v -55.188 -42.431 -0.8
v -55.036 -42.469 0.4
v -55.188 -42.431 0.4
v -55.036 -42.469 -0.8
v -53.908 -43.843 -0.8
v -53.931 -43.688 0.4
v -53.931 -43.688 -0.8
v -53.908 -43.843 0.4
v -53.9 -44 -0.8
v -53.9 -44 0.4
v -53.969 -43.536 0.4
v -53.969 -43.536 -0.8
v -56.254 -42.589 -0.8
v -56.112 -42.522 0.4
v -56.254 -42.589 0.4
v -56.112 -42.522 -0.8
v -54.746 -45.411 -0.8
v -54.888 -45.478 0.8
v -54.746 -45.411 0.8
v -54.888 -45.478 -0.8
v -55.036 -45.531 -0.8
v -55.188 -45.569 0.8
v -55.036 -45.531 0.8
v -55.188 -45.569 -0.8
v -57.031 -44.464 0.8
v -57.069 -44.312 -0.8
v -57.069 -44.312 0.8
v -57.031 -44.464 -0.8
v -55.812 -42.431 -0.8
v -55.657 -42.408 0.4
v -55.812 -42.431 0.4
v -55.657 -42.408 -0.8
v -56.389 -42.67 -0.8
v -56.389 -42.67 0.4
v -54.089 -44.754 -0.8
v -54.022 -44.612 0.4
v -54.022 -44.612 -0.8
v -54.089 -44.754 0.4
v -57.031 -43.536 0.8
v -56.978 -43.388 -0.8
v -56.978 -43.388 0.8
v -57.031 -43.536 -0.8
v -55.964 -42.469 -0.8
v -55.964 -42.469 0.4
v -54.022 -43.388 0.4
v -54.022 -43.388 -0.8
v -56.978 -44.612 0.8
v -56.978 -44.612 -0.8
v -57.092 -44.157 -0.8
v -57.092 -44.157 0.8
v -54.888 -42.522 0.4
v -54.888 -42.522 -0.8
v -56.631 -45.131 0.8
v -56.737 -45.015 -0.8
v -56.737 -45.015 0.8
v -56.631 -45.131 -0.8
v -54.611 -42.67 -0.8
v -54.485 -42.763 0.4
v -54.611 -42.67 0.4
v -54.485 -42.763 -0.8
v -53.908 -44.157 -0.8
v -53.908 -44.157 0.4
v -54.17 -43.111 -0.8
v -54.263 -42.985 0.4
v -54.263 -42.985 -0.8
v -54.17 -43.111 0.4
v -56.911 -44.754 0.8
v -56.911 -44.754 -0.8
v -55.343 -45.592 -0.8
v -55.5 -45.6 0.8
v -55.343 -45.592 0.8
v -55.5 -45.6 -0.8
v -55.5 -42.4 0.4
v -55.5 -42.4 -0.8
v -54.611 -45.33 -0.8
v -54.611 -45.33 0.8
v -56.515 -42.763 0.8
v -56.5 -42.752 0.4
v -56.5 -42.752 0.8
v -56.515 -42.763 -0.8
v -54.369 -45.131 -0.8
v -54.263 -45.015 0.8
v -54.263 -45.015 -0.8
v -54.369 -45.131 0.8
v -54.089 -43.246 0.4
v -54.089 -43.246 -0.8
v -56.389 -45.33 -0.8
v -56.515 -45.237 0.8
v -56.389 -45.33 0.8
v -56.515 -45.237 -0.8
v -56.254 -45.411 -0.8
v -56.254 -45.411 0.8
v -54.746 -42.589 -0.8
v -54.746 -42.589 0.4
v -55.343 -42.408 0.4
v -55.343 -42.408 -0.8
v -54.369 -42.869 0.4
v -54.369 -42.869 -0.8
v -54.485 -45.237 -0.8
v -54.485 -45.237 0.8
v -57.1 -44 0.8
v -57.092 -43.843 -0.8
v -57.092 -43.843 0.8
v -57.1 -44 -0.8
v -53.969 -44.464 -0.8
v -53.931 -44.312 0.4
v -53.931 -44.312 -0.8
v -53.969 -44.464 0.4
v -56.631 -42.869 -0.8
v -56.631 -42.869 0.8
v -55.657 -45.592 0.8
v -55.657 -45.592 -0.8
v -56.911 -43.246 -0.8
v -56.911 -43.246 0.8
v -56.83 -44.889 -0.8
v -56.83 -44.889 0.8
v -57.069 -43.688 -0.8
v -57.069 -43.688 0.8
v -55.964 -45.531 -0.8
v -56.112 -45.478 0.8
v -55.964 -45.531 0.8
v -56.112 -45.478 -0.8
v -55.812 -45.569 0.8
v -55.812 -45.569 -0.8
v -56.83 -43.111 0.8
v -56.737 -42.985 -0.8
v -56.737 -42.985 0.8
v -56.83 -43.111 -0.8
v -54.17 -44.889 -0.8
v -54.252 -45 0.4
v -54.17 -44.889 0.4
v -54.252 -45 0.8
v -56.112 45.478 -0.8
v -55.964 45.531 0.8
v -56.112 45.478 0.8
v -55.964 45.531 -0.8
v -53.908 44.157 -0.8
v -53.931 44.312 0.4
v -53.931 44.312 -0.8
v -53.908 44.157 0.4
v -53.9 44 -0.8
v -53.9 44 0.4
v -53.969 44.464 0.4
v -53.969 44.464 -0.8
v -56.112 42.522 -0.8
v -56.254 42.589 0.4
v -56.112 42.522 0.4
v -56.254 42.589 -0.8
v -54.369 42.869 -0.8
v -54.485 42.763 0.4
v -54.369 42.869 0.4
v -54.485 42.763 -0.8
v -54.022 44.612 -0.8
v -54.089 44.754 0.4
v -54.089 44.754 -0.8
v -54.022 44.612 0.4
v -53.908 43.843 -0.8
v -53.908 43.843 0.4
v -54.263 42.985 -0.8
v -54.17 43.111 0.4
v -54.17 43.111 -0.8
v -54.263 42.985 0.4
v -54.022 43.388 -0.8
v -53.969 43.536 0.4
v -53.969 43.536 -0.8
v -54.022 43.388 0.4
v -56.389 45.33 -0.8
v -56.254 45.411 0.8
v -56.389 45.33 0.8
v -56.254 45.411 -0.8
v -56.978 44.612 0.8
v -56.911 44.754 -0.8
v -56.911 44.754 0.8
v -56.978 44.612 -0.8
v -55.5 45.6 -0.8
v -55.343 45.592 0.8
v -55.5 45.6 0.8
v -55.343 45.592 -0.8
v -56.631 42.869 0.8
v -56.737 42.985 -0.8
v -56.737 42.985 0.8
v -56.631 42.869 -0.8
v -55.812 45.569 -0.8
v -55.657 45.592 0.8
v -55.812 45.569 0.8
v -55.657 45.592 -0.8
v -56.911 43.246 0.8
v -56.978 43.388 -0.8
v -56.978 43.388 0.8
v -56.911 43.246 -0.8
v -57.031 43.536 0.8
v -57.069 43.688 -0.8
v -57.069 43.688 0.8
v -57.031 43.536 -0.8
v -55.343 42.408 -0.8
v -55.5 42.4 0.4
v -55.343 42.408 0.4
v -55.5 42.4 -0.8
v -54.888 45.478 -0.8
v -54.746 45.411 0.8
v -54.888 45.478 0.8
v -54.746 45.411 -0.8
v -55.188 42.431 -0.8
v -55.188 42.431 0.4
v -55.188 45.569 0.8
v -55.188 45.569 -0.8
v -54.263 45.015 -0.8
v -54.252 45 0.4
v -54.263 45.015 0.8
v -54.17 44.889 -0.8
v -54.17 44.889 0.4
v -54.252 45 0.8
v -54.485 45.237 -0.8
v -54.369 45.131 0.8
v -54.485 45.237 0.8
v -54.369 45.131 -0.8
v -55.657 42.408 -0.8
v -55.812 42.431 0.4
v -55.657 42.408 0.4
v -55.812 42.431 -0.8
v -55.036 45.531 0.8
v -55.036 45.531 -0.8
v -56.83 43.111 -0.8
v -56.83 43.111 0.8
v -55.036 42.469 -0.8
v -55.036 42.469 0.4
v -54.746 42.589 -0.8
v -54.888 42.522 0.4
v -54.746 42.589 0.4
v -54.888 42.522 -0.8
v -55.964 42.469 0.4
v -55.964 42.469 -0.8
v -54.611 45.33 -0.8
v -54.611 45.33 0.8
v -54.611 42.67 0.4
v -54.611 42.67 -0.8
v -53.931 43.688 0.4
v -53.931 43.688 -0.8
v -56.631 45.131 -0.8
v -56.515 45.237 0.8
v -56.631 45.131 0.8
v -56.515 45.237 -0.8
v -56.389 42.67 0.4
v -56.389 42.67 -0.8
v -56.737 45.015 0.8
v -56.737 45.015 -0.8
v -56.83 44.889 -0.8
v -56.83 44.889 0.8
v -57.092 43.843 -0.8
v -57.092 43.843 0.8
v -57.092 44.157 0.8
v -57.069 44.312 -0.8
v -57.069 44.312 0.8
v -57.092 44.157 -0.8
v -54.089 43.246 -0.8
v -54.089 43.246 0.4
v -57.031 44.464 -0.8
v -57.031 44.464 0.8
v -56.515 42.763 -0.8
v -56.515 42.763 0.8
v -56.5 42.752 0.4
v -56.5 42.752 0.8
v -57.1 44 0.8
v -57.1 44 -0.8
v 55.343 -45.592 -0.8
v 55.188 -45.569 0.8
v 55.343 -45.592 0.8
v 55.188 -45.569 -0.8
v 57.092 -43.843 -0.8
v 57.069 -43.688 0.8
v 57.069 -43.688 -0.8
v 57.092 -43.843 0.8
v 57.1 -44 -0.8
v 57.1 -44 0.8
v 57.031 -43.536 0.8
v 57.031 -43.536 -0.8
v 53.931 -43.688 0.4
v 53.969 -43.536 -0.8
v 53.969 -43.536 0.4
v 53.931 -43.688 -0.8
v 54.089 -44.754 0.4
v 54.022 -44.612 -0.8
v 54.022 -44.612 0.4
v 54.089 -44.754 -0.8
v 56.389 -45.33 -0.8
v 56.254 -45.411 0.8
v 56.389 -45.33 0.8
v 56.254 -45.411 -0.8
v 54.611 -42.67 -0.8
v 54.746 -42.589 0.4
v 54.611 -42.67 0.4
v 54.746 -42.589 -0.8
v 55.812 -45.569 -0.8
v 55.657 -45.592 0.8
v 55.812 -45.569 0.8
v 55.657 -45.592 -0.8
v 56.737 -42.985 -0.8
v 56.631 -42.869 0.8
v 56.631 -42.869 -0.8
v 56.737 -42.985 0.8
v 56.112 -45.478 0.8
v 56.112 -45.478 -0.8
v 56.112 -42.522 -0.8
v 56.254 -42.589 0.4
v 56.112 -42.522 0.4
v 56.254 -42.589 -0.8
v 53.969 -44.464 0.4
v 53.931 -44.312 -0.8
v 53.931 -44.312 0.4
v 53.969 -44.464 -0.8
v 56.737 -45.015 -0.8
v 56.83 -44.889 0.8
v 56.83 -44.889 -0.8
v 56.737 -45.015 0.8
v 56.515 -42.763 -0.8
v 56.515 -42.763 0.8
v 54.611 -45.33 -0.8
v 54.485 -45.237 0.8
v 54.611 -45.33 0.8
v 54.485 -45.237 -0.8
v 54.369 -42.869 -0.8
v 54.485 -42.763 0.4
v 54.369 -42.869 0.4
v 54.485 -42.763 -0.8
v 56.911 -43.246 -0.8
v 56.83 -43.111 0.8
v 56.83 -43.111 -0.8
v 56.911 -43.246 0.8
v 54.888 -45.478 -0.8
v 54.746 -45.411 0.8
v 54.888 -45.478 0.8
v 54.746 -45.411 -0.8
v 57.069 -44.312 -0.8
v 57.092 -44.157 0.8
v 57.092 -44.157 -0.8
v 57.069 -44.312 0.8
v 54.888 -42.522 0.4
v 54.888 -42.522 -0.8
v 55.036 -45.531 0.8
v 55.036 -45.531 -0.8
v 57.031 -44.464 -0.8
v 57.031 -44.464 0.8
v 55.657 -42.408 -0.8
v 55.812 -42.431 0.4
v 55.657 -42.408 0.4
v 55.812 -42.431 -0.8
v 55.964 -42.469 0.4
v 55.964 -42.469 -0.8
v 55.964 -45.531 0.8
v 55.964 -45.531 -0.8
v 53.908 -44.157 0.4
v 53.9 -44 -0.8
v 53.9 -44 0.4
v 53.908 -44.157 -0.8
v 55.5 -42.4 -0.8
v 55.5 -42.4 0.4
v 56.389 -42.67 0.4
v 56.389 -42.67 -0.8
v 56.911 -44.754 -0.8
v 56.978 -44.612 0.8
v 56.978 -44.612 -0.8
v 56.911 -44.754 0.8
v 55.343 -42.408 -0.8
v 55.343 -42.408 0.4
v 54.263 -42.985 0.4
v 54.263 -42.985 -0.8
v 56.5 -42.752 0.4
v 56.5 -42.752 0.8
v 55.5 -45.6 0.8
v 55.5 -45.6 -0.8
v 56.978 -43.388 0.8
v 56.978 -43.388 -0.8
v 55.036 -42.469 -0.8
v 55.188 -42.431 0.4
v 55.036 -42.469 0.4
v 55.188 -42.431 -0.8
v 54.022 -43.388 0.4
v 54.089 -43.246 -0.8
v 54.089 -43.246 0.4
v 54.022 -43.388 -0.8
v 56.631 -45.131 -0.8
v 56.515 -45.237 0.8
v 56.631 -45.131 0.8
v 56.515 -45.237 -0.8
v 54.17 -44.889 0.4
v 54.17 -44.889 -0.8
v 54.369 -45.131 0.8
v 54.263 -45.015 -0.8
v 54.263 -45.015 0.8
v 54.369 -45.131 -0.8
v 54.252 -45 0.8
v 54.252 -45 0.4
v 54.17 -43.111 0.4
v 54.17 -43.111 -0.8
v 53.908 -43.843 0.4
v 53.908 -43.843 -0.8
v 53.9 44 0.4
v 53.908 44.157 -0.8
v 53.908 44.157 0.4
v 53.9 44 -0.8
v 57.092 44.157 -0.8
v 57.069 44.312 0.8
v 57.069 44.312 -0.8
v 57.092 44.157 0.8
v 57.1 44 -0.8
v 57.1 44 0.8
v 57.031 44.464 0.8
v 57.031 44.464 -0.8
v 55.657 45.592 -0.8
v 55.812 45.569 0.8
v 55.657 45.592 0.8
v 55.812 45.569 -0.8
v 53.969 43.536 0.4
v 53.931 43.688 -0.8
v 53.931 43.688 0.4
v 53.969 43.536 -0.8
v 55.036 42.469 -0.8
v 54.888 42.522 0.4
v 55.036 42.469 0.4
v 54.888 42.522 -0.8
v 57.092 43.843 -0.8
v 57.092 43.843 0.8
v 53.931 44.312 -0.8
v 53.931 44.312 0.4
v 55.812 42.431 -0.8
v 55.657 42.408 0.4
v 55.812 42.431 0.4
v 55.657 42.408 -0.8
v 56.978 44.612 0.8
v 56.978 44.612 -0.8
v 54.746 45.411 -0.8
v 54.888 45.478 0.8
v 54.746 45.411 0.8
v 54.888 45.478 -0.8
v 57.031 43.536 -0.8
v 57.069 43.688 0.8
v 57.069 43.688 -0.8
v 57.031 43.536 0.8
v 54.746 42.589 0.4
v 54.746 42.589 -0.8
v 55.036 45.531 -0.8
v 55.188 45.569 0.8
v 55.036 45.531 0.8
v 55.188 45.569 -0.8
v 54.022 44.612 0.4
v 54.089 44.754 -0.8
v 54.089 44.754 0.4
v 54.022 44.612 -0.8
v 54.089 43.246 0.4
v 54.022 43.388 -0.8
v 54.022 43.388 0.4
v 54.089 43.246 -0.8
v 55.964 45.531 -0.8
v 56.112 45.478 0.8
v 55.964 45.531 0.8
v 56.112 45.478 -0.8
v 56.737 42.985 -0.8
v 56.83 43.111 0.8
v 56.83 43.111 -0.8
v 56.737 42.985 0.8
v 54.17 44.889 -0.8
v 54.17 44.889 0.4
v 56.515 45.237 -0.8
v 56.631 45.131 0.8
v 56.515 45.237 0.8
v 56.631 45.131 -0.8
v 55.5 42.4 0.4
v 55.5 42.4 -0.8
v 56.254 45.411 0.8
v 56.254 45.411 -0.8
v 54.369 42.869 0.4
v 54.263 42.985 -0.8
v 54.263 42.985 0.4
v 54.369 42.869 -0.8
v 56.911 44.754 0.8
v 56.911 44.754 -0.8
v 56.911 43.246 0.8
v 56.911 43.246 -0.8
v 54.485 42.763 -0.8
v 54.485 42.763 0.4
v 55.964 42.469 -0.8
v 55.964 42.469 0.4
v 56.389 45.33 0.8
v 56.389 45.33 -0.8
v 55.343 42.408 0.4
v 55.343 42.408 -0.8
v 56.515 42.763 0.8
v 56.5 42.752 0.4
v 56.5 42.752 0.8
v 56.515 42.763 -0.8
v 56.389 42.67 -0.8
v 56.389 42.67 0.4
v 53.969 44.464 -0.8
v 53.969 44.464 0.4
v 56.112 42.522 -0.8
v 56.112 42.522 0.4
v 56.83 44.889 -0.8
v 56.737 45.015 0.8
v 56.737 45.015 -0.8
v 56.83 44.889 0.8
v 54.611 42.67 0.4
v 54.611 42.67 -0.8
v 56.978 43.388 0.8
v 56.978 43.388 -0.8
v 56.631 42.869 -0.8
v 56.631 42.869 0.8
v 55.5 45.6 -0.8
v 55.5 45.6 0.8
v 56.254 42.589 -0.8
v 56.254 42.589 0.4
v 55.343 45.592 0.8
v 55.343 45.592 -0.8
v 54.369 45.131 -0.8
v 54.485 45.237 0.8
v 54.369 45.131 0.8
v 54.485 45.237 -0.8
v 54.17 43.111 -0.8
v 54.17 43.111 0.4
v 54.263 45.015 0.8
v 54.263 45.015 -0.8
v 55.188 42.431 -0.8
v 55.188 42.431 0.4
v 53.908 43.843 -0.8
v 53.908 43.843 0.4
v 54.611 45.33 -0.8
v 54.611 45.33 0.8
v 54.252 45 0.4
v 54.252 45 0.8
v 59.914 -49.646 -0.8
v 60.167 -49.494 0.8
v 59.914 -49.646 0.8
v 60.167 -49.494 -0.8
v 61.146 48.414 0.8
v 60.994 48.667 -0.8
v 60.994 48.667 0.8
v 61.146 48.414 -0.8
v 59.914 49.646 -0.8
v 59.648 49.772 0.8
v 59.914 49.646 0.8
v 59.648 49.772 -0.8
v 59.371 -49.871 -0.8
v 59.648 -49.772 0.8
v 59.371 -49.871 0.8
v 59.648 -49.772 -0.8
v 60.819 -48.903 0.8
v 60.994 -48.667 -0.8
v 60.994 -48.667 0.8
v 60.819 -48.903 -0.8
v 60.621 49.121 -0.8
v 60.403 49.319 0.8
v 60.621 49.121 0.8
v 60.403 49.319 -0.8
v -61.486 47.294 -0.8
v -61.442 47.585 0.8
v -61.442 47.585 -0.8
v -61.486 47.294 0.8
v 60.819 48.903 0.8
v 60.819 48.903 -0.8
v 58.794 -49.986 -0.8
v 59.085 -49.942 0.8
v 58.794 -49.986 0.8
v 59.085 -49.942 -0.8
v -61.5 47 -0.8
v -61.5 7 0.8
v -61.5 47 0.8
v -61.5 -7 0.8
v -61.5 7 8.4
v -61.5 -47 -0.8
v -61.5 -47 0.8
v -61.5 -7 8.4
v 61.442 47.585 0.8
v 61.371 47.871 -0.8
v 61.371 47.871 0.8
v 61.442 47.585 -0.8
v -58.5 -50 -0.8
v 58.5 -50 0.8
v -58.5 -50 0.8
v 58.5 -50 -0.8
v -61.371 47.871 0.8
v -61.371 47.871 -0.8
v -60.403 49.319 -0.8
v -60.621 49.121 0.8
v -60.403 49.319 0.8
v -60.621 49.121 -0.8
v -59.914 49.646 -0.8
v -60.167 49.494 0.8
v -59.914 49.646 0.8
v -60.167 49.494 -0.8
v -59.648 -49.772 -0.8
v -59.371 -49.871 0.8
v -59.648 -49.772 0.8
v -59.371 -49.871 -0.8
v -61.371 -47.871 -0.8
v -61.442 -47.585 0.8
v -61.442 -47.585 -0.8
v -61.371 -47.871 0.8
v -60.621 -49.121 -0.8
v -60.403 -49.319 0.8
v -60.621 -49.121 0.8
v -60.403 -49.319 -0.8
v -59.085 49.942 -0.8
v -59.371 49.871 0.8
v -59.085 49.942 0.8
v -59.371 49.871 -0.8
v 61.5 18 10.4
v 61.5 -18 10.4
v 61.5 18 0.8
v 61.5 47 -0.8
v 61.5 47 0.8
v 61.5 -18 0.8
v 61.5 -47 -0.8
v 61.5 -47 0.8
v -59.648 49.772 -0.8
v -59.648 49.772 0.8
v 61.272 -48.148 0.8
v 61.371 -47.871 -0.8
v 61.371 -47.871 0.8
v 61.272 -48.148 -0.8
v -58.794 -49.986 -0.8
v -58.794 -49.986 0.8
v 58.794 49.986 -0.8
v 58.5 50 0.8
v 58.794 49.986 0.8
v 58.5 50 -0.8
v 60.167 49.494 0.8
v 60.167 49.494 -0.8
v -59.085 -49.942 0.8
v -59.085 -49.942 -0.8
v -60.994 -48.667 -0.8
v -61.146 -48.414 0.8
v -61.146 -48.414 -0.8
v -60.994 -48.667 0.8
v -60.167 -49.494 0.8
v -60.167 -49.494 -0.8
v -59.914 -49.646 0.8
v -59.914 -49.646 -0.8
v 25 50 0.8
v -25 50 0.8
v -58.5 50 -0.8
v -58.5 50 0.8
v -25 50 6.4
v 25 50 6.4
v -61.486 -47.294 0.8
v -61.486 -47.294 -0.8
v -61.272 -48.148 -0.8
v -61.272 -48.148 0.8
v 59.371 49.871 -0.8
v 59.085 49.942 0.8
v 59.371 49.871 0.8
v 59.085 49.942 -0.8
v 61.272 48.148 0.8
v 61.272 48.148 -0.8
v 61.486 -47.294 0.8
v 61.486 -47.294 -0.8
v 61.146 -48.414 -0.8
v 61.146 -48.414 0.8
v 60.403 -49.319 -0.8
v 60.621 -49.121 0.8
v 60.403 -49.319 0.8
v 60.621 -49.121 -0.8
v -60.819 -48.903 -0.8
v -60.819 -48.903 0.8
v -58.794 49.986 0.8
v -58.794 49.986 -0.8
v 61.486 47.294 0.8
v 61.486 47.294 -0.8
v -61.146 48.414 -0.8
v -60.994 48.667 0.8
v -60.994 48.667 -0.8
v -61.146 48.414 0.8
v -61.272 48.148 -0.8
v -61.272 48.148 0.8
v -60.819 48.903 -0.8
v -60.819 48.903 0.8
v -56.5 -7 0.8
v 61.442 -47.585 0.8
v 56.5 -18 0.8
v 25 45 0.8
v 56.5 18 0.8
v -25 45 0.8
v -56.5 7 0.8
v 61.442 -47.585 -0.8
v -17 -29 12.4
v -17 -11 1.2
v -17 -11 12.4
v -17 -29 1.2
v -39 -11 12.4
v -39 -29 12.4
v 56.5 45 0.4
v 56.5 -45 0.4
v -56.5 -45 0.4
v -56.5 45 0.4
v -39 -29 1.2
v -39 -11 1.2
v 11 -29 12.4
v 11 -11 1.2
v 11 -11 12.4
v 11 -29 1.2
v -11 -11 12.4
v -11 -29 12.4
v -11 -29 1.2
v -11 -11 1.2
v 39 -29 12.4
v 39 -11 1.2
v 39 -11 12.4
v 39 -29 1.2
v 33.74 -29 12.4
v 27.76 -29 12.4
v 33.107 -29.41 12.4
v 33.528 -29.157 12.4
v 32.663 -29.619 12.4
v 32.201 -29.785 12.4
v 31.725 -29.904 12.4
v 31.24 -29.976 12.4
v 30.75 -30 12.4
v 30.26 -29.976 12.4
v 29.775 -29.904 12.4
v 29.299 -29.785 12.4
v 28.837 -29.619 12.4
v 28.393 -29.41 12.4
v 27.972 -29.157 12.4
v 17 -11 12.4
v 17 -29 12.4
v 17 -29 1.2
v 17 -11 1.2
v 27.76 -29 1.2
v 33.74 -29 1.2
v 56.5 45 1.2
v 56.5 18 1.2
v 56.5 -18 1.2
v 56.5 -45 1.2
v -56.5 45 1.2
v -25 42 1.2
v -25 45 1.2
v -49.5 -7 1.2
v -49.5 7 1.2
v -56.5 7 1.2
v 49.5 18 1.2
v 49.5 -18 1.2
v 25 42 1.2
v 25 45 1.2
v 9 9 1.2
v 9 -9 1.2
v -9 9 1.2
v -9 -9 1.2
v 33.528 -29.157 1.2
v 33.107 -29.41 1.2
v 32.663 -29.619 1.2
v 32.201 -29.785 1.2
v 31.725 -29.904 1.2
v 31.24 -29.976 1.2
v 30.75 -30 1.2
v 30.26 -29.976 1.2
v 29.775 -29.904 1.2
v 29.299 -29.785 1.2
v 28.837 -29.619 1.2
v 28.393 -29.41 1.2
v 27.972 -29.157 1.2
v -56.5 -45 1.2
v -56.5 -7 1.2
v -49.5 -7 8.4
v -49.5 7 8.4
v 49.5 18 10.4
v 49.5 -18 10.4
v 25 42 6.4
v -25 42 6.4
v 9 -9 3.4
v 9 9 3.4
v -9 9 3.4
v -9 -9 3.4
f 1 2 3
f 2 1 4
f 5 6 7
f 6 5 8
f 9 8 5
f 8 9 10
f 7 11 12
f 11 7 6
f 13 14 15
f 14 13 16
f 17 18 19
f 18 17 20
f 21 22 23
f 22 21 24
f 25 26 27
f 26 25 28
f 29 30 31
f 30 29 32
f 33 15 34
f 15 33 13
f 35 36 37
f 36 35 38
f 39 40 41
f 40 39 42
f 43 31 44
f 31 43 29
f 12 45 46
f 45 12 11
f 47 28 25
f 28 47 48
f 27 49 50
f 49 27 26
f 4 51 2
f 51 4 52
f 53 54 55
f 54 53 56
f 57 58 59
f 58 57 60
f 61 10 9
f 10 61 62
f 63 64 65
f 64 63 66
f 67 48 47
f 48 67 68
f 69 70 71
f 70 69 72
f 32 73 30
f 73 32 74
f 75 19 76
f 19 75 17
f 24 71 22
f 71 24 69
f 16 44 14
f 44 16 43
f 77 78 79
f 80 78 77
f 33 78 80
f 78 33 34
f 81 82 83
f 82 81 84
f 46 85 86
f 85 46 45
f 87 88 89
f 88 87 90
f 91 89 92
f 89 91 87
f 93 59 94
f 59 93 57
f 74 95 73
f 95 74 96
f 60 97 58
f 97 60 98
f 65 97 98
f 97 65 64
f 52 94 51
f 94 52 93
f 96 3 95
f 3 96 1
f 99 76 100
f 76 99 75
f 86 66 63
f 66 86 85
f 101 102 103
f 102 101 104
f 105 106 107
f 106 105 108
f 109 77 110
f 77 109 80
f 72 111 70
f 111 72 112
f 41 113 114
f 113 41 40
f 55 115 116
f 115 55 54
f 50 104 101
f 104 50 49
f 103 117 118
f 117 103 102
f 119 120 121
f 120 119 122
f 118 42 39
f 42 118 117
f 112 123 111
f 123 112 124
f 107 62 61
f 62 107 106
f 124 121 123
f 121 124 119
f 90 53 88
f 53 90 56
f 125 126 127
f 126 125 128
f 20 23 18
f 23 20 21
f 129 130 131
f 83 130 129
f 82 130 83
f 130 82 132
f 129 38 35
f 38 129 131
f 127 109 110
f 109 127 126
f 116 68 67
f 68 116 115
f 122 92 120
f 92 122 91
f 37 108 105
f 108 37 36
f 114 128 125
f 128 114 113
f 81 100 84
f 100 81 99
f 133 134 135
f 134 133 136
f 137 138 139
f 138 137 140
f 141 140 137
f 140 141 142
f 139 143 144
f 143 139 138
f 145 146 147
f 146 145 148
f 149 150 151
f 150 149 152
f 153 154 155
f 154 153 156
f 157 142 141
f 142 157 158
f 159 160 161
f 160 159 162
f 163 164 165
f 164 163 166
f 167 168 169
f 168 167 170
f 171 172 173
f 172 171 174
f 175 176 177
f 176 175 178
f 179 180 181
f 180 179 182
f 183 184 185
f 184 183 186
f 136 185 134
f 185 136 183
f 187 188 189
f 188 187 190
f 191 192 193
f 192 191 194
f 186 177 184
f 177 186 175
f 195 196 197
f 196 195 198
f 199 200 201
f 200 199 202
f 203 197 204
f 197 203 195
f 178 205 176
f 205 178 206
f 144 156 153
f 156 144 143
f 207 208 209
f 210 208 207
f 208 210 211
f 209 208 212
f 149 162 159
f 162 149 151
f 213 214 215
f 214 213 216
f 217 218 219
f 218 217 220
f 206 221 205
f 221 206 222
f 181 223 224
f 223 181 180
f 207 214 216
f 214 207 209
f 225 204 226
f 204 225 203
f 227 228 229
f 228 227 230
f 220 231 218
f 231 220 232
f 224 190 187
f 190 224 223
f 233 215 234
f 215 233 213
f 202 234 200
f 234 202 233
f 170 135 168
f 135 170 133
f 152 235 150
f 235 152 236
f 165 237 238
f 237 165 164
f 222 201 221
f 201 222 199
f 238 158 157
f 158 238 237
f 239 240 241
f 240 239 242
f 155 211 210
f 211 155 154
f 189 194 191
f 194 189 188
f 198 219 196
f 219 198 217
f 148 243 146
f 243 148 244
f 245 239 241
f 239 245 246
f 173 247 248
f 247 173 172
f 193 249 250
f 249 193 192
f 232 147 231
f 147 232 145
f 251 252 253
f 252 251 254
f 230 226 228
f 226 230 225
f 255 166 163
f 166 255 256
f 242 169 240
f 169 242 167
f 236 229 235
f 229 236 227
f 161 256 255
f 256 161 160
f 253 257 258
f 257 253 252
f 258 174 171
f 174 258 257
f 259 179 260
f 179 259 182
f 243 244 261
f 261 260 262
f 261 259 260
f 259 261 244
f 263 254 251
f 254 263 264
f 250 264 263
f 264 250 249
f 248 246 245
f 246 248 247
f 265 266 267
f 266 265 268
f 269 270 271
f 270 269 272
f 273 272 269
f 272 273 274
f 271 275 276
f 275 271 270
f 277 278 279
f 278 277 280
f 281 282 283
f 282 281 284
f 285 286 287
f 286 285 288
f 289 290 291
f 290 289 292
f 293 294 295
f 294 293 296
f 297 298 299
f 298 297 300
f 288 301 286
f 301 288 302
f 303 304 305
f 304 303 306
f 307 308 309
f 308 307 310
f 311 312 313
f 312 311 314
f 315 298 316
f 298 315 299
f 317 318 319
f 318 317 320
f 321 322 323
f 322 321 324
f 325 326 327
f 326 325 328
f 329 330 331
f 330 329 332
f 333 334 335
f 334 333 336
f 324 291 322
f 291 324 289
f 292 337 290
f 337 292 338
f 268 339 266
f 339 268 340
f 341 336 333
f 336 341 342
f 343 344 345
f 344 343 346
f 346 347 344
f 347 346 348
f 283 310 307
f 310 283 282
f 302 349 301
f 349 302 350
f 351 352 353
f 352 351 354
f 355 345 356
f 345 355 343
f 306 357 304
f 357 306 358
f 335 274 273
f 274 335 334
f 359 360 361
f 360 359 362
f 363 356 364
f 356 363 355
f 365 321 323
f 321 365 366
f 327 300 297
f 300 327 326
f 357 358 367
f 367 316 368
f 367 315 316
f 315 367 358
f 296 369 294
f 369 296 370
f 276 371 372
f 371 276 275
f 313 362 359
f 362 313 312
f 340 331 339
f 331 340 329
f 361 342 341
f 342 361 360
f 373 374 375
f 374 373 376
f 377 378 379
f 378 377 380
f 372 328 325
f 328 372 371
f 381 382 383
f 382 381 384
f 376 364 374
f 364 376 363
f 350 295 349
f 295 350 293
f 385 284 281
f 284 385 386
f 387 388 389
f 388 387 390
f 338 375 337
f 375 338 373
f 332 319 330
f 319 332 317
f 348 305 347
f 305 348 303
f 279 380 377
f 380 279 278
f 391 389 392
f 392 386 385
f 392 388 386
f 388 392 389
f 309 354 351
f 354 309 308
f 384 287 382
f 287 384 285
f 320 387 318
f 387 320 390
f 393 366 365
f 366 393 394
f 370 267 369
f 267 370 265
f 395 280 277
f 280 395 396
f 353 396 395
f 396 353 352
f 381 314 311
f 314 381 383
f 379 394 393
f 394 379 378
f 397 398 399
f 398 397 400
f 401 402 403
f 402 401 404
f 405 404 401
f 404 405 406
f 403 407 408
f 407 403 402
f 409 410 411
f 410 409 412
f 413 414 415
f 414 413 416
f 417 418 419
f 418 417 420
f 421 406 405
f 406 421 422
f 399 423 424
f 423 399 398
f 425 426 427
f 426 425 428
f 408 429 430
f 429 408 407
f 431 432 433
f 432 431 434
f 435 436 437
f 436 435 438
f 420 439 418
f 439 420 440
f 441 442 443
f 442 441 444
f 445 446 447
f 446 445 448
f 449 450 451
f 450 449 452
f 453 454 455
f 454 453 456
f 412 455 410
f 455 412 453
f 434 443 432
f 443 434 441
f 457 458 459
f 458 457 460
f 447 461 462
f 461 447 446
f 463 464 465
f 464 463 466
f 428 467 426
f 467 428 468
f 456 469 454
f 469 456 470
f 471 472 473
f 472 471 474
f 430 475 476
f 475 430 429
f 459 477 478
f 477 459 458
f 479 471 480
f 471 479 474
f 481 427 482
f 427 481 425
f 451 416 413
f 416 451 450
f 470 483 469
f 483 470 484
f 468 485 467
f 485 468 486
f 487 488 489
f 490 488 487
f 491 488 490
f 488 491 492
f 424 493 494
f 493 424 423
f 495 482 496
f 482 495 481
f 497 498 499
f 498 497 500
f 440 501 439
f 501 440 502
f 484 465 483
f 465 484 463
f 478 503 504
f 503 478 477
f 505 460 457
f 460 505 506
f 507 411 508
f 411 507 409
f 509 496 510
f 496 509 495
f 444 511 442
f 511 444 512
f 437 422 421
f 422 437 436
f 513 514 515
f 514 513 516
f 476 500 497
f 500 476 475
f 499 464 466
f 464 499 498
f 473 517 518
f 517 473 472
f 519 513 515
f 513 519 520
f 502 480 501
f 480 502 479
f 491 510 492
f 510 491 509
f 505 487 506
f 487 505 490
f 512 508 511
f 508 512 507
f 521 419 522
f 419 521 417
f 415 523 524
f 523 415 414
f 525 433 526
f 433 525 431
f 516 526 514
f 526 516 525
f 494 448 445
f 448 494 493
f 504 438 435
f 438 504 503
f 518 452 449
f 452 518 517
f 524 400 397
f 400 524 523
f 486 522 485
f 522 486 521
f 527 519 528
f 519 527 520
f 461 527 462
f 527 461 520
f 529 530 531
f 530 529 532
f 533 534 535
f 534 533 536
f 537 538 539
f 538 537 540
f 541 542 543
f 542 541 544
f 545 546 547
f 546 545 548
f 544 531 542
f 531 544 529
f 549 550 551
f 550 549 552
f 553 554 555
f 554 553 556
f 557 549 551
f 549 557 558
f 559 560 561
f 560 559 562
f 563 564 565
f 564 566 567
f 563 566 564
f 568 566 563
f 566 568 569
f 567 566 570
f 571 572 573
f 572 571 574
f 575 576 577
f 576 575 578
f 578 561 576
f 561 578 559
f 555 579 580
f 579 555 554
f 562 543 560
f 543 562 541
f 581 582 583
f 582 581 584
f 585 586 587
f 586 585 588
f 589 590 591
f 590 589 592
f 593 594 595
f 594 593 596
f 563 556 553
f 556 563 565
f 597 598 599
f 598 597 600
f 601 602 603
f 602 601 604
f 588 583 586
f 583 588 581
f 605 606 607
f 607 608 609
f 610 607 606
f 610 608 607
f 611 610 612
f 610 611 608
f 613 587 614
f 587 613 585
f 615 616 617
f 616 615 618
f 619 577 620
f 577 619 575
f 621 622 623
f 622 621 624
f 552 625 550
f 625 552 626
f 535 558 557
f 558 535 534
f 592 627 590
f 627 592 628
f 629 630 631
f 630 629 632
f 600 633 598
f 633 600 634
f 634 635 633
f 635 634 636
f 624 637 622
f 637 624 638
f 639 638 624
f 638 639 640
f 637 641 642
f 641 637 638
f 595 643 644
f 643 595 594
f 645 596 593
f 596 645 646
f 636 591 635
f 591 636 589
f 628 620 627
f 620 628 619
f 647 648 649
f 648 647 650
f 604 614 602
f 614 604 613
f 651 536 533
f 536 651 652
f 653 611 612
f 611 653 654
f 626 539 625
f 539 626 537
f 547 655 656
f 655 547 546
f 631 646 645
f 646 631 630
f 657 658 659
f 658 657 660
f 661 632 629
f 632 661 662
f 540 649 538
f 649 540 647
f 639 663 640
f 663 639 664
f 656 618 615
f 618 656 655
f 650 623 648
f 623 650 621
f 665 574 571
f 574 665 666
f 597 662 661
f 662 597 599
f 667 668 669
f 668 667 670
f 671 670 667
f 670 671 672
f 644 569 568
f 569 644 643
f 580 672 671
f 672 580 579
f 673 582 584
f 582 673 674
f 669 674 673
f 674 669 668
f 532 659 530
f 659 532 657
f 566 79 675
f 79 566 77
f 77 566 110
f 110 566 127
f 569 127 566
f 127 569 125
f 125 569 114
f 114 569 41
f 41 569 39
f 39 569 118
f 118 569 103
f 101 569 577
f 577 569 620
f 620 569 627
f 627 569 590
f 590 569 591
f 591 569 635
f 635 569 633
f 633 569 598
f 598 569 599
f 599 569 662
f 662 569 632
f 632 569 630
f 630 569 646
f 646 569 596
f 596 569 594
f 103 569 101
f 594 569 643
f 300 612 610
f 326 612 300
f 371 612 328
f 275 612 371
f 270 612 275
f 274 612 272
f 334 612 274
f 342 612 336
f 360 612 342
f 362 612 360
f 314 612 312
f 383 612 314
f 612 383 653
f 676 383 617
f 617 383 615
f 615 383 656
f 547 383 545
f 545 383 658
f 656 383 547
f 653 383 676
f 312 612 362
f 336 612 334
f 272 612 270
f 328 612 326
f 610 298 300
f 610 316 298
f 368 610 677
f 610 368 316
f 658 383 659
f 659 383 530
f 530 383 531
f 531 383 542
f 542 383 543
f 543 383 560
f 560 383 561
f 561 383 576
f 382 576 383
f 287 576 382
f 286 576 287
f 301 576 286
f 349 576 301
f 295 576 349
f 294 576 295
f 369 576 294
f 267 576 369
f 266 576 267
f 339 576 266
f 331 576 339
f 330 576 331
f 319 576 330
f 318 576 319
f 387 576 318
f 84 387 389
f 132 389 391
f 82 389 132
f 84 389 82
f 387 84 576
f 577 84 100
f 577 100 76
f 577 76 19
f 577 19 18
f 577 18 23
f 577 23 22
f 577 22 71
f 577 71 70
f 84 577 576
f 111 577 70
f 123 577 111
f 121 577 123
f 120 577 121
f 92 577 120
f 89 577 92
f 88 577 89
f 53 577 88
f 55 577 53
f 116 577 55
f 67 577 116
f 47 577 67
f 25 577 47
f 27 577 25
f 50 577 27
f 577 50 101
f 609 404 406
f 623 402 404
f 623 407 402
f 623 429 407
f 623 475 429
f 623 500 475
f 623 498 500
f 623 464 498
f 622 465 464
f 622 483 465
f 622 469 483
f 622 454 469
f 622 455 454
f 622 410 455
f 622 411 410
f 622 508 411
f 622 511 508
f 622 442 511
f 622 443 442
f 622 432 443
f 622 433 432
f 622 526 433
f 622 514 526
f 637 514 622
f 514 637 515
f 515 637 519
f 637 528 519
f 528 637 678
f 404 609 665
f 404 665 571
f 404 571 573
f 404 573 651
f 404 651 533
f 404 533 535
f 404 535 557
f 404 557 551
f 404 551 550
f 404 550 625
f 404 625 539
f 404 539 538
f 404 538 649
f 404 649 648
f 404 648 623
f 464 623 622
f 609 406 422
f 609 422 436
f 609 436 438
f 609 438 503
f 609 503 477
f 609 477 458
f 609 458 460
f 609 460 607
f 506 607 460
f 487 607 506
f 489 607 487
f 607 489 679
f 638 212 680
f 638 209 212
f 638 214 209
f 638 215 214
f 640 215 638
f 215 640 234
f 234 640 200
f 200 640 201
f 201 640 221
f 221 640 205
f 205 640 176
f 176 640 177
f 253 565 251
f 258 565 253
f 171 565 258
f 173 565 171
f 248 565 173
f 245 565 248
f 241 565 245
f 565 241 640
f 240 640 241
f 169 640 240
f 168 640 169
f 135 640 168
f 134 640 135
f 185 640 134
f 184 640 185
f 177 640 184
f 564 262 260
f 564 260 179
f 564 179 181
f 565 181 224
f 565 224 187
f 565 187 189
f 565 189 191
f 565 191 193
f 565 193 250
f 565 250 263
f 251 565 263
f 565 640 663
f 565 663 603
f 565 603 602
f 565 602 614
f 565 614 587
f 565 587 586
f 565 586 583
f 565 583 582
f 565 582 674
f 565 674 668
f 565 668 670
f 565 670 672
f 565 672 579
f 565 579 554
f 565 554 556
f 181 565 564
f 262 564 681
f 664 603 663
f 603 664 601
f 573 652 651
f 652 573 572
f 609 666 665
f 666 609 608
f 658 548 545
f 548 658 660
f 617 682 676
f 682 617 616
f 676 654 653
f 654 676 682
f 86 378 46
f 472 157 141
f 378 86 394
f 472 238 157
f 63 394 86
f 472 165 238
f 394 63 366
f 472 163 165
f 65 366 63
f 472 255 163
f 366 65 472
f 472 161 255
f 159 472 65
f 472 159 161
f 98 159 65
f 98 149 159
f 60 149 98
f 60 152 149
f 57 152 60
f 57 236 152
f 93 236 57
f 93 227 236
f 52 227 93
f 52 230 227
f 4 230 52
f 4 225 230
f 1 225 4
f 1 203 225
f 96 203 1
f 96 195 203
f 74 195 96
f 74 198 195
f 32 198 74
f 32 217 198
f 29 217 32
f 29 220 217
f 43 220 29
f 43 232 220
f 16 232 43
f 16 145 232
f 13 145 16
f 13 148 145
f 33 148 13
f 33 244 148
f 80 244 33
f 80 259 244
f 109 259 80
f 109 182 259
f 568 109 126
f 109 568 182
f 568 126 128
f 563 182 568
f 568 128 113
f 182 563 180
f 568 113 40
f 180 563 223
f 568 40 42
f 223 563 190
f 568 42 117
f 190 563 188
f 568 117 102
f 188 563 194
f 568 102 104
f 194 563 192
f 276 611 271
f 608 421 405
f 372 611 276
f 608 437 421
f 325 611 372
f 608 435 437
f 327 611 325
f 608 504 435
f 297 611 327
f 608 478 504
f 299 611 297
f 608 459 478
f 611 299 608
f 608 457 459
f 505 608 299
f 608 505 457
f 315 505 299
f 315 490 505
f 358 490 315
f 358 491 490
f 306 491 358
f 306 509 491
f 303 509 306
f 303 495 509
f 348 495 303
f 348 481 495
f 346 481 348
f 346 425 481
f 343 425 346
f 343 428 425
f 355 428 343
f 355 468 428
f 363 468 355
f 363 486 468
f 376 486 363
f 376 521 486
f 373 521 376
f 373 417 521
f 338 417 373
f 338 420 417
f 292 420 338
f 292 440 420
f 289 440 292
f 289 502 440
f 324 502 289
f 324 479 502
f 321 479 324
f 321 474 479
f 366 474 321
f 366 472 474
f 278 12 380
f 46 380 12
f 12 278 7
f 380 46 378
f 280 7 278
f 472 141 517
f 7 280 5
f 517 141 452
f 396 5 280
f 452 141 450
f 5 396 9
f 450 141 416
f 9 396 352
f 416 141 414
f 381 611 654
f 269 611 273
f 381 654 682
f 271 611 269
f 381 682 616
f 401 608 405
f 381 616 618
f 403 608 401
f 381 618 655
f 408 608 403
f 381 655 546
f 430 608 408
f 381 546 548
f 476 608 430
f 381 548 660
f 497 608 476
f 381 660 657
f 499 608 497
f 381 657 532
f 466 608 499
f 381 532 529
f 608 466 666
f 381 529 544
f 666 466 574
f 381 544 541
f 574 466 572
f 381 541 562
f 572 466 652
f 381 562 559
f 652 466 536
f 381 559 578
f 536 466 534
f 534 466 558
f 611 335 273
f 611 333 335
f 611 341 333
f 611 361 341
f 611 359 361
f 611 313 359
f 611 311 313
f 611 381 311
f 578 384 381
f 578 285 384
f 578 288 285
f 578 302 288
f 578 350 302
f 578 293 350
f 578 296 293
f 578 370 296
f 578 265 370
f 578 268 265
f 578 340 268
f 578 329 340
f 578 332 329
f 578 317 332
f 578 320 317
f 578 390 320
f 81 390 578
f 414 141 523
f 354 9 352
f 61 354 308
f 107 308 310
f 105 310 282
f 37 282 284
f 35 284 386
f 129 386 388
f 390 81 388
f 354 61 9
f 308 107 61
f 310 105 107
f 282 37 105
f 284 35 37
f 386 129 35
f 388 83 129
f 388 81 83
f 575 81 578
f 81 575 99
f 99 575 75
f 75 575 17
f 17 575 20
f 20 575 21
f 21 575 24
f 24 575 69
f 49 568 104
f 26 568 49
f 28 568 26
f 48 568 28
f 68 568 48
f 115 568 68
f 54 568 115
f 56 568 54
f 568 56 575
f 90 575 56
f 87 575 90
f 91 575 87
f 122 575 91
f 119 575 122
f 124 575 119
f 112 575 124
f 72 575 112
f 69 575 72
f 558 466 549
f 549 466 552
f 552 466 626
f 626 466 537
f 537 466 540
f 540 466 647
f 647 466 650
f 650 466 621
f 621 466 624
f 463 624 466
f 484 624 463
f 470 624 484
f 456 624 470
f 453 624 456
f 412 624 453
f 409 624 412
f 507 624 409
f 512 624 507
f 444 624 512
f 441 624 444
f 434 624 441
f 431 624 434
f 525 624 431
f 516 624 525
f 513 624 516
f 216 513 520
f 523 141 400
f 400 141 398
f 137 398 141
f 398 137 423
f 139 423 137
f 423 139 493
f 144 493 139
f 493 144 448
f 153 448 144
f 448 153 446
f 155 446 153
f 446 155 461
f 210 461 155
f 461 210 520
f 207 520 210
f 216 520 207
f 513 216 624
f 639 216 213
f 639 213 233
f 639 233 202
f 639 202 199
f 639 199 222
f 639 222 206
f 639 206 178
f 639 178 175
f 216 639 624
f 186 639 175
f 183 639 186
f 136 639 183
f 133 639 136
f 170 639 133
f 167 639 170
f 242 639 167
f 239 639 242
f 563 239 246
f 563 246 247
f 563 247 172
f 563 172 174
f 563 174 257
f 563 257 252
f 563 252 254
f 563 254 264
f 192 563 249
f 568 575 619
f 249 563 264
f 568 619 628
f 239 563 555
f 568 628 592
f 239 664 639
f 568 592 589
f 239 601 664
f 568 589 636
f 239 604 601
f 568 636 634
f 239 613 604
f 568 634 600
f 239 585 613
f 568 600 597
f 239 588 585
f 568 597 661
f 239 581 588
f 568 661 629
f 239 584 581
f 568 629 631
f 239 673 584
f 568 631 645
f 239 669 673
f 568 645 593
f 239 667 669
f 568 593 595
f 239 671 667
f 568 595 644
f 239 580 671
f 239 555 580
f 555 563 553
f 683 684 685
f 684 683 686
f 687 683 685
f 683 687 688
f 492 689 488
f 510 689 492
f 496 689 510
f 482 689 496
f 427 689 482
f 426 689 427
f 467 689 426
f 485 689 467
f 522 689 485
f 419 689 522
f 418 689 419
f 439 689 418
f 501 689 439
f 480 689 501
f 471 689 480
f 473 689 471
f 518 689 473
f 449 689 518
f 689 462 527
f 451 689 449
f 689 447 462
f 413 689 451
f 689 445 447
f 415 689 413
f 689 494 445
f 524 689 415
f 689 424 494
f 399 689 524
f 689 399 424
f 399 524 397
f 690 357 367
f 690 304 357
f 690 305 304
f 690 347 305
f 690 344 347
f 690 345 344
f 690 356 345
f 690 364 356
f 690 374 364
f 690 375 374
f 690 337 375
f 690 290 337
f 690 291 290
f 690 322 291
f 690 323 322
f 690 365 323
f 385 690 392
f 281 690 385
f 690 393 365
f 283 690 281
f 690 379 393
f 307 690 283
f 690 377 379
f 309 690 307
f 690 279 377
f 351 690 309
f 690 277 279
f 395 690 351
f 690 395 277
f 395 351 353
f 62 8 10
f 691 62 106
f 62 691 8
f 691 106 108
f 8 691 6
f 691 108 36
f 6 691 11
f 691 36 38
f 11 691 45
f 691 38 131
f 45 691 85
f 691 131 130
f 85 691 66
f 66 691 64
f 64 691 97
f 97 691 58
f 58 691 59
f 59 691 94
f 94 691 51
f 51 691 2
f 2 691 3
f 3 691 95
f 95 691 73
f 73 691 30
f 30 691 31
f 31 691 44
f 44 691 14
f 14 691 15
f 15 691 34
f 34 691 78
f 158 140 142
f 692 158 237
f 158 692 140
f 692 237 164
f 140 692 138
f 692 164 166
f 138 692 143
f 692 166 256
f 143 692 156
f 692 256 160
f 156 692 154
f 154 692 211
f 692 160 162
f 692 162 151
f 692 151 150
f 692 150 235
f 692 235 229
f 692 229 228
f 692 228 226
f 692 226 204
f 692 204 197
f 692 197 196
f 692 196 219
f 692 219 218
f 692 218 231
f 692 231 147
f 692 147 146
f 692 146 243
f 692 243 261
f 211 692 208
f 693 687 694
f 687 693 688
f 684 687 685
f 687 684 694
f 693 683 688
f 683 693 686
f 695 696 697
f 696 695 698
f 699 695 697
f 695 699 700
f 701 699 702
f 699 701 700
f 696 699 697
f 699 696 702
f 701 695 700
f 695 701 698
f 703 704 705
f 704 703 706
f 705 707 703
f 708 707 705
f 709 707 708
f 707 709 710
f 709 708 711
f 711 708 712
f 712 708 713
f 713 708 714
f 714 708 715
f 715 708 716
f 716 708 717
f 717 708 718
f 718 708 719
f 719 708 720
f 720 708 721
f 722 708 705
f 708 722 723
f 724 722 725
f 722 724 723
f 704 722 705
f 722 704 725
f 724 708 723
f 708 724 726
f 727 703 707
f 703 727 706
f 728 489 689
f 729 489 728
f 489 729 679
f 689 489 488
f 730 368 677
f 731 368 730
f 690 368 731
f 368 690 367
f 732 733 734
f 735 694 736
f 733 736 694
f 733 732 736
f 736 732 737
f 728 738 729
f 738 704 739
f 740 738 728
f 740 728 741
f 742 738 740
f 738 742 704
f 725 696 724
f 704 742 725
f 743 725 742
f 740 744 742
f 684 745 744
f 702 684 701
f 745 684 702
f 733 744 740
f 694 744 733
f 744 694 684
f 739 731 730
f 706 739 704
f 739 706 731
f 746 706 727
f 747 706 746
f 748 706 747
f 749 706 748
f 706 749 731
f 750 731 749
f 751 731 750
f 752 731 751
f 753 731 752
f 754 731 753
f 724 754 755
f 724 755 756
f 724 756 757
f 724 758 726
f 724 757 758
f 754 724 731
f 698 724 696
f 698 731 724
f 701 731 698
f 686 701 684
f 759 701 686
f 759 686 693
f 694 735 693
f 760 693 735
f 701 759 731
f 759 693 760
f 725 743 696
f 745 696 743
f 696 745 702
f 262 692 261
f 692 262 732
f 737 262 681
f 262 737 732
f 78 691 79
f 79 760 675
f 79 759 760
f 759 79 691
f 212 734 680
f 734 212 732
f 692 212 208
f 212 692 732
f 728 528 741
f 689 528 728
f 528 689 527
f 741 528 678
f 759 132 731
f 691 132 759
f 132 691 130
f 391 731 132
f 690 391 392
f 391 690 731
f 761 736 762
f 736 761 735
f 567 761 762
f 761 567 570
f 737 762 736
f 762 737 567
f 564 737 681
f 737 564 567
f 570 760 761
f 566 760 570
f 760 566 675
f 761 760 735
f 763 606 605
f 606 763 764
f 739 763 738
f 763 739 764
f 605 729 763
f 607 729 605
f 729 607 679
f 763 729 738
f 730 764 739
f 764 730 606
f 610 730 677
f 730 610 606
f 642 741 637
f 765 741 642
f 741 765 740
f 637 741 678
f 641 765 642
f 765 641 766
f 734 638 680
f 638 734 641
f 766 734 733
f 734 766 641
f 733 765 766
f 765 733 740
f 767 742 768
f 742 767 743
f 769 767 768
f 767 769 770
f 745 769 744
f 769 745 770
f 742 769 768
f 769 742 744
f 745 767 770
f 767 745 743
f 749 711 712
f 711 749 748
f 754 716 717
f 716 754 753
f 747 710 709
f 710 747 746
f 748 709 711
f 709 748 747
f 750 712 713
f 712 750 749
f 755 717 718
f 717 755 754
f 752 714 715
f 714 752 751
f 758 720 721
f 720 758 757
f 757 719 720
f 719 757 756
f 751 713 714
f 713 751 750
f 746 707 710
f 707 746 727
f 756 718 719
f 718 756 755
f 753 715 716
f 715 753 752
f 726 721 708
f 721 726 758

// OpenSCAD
// 3D Printer Control Board (PCB) - 123.0mm x 100.0mm x 1.6mm
// One connected solid with recognizable PCB features (outline, mounting holes, connectors/components)

$fn = 64;

// Parameters
pcb_length = 123.0;
pcb_width  = 100.0;
pcb_thickness = 1.6;

// Board styling
corner_r = 3.0;

// Mounting holes
hole_d = 3.2;
hole_edge_margin = 6.0; // from each edge to hole center

// Component heights (above PCB)
comp_base_h = 0.8;   // slight soldermask/feature relief
usb_h = 8.0;
usb_w = 14.0;
usb_d = 12.0;

term_h = 10.0;
term_w = 36.0;
term_d = 12.0;

headers_h = 6.0;
headers_w = 50.0;
headers_d = 8.0;

driver_h = 12.0;
driver_w = 18.0;
driver_d = 22.0;

mcu_h = 3.0;
mcu_w = 18.0;
mcu_d = 18.0;

cap_h = 12.0;
cap_r = 5.0;

// Small overlap to guarantee connectivity
overlap = 0.4;

// Helpers
module rounded_rect_prism(l, w, h, r) {
    // Rounded rectangle extruded to height h, centered
    linear_extrude(height=h, center=true)
        offset(r=r)
            square([l - 2*r, w - 2*r], center=true);
}

module pcb_outline() {
    rounded_rect_prism(pcb_length, pcb_width, pcb_thickness, corner_r);
}

module mounting_holes() {
    // Through-holes (subtracted)
    for (sx = [-1, 1], sy = [-1, 1]) {
        translate([
            sx * (pcb_length/2 - hole_edge_margin),
            sy * (pcb_width/2  - hole_edge_margin),
            0
        ])
        cylinder(h=pcb_thickness + 2, d=hole_d, center=true);
    }
}

module component_block(size_xyz, pos_xy, h_above) {
    // Places a block sitting on top of PCB, with slight overlap into PCB
    // size_xyz = [x,y,z] where z = h_above
    translate([pos_xy[0], pos_xy[1], pcb_thickness/2 + h_above/2 - overlap])
        cube([size_xyz[0], size_xyz[1], h_above], center=true);
}

module component_cyl(r, h_above, pos_xy) {
    translate([pos_xy[0], pos_xy[1], pcb_thickness/2 + h_above/2 - overlap])
        cylinder(r=r, h=h_above, center=true);
}

module pcb_with_features() {
    union() {
        // PCB body with mounting holes
        color([0.0, 0.4, 0.2])
        difference() {
            pcb_outline();
            mounting_holes();
        }

        // Slight raised "silkscreen/trace" relief to make top view non-blank
        // (kept very thin but visible)
        color([0.0, 0.5, 0.25])
        translate([0, 0, pcb_thickness/2 + comp_base_h/2 - overlap])
            cube([pcb_length - 10, pcb_width - 10, comp_base_h], center=true);

        // Connectors/components (all connected via calculated Z placement)

        // USB connector on left edge
        color([0.75, 0.75, 0.75])
        component_block([usb_d, usb_w, usb_h],
                        [-(pcb_length/2 - usb_d/2), 0],
                        usb_h);

        // Screw terminal block on right edge
        color([0.1, 0.35, 0.1])
        component_block([term_d, term_w, term_h],
                        [(pcb_length/2 - term_d/2), 0],
                        term_h);

        // Pin headers along top edge
        color([0.1, 0.1, 0.1])
        component_block([headers_w, headers_d, headers_h],
                        [0, (pcb_width/2 - headers_d/2)],
                        headers_h);

        // Stepper driver modules (3x) near bottom half
        color([0.0, 0.2, 0.6])
        for (i = [-1, 0, 1]) {
            component_block([driver_d, driver_w, driver_h],
                            [i * (driver_d + 6), -(pcb_width*0.20)],
                            driver_h);
        }

        // MCU in center
        color([0.15, 0.15, 0.15])
        component_block([mcu_d, mcu_w, mcu_h],
                        [0, 0],
                        mcu_h);

        // Electrolytic capacitor near right-bottom quadrant
        color([0.05, 0.05, 0.05])
        component_cyl(cap_r, cap_h, [pcb_length*0.25, -(pcb_width*0.25)]);
    }
}

// Final output
pcb_with_features();
